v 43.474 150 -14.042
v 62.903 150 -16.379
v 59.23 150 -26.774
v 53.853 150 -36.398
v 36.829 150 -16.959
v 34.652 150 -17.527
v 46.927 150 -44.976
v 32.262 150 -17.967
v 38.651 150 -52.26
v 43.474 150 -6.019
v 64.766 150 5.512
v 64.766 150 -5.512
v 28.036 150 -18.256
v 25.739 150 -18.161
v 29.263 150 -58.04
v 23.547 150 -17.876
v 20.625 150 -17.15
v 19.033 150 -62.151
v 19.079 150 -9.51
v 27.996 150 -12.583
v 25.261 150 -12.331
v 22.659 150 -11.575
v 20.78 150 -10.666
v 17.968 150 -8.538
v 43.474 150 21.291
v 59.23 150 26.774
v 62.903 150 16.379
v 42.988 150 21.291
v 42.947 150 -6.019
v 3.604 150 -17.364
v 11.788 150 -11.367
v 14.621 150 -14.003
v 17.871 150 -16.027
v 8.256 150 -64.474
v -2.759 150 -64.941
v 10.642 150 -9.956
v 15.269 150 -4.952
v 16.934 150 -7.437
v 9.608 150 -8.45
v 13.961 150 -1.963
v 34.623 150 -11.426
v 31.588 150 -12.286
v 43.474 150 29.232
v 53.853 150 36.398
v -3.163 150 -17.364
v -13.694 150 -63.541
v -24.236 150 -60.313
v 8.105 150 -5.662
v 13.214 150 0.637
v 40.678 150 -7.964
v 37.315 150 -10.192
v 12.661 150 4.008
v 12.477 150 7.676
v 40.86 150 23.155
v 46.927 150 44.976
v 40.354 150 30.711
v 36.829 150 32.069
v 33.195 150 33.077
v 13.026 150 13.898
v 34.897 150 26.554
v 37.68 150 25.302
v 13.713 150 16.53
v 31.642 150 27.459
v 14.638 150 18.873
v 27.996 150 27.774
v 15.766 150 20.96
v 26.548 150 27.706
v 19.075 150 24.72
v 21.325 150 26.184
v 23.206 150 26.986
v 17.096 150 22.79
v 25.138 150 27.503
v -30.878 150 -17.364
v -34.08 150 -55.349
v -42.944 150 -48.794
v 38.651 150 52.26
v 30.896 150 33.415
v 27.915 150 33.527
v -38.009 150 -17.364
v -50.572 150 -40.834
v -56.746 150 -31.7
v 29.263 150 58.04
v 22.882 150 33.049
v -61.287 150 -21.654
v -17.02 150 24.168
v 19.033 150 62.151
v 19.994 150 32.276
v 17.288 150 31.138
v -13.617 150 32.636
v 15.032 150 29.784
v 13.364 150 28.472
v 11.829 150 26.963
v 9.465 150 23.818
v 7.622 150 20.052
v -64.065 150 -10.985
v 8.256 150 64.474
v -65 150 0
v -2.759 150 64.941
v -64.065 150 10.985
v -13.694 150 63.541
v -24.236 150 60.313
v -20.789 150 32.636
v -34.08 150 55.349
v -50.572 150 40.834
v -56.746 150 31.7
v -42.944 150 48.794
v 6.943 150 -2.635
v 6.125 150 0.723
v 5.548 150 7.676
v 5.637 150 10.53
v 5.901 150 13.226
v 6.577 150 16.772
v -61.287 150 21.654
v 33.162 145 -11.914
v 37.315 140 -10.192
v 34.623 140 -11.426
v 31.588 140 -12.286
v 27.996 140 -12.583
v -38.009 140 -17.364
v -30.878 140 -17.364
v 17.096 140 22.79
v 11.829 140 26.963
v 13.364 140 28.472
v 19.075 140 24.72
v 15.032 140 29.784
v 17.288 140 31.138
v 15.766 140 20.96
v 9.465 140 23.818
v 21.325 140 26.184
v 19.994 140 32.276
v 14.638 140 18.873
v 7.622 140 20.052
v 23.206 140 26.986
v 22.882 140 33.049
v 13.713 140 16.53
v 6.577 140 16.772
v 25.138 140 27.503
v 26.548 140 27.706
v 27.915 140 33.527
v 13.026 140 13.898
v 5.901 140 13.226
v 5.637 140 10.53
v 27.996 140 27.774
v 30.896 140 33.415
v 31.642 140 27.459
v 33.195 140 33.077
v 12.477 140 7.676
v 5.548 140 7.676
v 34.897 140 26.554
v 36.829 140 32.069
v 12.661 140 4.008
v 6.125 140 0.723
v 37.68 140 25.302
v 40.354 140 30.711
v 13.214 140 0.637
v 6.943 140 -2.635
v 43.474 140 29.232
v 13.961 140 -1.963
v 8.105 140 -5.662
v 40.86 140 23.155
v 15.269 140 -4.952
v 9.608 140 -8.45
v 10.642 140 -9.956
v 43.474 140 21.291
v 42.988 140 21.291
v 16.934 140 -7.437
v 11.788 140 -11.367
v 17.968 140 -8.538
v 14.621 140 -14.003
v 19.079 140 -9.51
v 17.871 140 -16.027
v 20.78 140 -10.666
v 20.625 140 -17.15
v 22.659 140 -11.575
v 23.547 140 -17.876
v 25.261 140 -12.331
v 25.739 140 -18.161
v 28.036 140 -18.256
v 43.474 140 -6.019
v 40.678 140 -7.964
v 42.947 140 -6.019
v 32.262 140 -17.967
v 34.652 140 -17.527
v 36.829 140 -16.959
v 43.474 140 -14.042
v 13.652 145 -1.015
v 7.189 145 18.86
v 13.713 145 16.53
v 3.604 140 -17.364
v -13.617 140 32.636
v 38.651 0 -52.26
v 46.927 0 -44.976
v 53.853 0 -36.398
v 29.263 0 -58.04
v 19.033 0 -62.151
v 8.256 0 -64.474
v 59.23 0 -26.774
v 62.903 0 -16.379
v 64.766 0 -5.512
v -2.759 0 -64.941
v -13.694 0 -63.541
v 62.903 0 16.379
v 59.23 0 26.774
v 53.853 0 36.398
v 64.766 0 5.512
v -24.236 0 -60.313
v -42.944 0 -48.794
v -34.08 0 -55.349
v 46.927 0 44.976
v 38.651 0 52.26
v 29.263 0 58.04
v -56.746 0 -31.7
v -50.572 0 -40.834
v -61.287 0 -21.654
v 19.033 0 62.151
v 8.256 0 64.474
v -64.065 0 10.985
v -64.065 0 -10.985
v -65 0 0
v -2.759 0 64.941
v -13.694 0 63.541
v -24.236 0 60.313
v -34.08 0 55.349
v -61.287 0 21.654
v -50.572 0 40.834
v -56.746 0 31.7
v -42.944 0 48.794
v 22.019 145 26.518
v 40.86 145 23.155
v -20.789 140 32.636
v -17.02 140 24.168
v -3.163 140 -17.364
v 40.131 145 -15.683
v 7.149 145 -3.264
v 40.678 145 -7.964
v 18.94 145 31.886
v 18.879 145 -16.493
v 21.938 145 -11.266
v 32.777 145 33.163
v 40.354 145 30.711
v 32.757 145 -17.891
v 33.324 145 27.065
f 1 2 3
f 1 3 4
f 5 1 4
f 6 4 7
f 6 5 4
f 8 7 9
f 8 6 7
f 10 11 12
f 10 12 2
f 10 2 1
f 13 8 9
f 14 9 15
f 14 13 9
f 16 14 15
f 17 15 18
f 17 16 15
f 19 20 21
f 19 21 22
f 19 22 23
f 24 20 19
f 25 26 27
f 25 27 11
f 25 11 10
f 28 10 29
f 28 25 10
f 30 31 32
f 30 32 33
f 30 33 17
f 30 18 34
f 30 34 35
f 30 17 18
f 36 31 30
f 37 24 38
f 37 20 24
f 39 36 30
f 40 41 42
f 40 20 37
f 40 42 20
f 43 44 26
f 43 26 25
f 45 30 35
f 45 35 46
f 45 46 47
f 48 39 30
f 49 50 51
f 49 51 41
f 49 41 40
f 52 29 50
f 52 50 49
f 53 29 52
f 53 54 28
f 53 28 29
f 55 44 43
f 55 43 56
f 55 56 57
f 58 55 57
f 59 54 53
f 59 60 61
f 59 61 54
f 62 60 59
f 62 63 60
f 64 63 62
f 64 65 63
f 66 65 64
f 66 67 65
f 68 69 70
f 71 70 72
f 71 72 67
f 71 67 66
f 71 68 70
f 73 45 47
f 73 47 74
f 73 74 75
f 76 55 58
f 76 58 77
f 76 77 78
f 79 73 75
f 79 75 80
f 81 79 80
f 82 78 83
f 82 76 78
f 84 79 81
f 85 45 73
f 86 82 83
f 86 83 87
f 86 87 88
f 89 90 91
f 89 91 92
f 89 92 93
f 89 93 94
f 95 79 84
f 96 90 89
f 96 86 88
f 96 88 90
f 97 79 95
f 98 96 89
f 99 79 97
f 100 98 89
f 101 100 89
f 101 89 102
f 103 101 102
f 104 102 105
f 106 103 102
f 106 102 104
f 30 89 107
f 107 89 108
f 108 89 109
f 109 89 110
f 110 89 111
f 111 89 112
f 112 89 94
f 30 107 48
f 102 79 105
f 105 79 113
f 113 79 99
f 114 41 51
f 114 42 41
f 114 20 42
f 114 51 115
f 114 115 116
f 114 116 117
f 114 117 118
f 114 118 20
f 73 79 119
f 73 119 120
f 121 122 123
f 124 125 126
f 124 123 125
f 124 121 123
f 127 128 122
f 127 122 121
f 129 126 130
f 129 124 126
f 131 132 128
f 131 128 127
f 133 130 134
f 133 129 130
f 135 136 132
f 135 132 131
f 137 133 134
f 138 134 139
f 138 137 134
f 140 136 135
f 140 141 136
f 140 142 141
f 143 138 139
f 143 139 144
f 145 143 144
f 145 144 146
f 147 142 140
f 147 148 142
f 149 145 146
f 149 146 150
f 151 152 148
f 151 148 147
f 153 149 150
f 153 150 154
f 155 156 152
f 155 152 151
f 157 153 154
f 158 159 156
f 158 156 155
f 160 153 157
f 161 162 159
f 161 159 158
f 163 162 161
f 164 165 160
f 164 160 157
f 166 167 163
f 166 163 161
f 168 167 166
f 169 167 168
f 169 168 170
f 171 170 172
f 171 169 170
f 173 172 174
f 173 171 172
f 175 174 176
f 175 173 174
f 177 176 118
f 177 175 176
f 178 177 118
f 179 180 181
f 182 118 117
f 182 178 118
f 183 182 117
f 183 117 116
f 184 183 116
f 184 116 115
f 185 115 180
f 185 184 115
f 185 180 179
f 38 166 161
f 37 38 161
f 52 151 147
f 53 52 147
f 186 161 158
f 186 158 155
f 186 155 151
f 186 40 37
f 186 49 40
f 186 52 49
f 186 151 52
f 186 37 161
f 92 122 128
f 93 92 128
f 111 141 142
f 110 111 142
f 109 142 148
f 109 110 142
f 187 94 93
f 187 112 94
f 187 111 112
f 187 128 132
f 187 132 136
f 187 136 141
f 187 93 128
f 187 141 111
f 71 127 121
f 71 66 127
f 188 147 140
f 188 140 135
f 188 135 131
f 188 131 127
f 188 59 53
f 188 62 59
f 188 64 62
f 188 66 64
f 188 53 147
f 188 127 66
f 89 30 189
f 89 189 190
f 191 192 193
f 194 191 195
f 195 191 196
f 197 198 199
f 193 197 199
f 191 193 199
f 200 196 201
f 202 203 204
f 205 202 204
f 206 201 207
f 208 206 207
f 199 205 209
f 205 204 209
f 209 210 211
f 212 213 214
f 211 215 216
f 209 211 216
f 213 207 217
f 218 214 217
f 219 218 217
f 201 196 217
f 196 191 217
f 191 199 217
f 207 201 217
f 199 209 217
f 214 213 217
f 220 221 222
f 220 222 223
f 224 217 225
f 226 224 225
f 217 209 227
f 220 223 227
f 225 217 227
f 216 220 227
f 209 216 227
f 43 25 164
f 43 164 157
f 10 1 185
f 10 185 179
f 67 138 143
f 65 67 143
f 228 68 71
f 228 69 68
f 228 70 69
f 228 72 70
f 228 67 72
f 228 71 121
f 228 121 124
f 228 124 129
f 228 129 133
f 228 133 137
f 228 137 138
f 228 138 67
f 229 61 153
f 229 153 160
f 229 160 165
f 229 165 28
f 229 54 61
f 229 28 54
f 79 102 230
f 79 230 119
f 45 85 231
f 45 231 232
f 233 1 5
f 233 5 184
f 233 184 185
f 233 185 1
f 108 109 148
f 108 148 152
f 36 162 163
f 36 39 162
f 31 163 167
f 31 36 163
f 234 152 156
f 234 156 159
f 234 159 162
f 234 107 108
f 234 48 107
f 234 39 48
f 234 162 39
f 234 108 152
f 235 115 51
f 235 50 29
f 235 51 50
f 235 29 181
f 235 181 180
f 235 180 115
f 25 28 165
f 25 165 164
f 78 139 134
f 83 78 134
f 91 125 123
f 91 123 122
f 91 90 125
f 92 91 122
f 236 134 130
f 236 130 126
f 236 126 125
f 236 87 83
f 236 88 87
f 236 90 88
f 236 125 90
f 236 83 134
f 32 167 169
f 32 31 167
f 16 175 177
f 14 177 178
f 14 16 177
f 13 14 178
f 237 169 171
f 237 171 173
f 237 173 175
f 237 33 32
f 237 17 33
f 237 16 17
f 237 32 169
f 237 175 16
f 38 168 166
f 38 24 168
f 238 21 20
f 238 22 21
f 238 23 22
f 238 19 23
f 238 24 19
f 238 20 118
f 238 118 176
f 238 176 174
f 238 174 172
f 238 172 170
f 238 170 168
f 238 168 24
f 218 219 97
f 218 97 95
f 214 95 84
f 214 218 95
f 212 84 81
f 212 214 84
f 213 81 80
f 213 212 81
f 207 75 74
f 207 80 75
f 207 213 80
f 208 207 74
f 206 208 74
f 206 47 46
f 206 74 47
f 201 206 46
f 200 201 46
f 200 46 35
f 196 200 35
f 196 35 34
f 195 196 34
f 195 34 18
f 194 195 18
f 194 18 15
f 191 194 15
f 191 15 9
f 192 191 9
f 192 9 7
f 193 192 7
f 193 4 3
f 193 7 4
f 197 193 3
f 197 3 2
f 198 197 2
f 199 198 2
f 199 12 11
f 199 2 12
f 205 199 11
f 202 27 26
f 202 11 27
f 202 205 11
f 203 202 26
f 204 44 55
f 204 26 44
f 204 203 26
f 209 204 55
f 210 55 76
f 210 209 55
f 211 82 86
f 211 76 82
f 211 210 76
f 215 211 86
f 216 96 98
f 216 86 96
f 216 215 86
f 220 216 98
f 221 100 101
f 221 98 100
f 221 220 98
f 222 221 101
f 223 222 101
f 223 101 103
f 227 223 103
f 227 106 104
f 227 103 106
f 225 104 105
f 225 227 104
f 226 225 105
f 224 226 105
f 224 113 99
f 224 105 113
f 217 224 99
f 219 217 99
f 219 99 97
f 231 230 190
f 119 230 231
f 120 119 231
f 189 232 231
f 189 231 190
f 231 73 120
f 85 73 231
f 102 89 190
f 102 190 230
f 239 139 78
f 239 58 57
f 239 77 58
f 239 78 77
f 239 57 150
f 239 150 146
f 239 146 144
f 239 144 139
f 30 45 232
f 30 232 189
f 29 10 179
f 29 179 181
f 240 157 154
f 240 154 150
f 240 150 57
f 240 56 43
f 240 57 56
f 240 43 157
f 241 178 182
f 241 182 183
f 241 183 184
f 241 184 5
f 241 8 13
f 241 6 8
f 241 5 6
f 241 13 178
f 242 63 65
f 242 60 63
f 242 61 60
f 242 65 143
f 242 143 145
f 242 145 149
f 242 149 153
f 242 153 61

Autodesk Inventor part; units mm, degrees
ref_plane "YZ Plane" through (0, 0, 0) normal (1, 0, 0) x (0, 1, 0)
ref_plane "XZ Plane" through (0, 0, 0) normal (0, 1, 0) x (-1, 0, 0)
ref_plane "XY Plane" through (0, 0, 0) normal (0, 0, 1) x (1, 0, 0)
sketch "Sketch1" plane through (0, 0, 0) normal (0, 1, 0) x (-1, 0, 0)
  circle A0 centre (0, 0) radius 65
  line L0 (0, 0) -> (0, -25) construction
  circle A1 centre (0, -25) radius 11.5 construction
  circle A2 centre (21.6506, -12.5) radius 11.5 construction
  circle A3 centre (21.6506, 12.5) radius 11.5 construction
  circle A4 centre (0, 25) radius 11.5 construction
  circle A5 centre (-21.6506, 12.5) radius 11.5 construction
  circle A6 centre (-21.6506, -12.5) radius 11.5 construction
  line L1 (0, 0) -> (-21.6506, 37.5) construction
  circle A7 centre (-21.6506, 37.5) radius 11.5 construction
  circle A8 centre (-43.3013, 0) radius 11.5 construction
  circle A9 centre (-21.6506, -37.5) radius 11.5 construction
  circle A10 centre (21.6506, -37.5) radius 11.5 construction
  circle A11 centre (43.3013, 0) radius 11.5 construction
  circle A12 centre (21.6506, 37.5) radius 11.5 construction
  circle A13 centre (0, 50) radius 11.5 construction
  circle A14 centre (-43.3013, 25) radius 11.5 construction
  circle A15 centre (-43.3013, -25) radius 11.5 construction
  circle A16 centre (0, -50) radius 11.5 construction
  circle A17 centre (43.3013, -25) radius 11.5 construction
  circle A18 centre (43.3013, 25) radius 11.5 construction
  dimension "d0" = 130
  dimension "d5" = 25
  dimension "d6" = 23
  dimension "d9" = 360
  dimension "d11" = 23
  dimension "d13" = 150
  dimension "d16" = 360
  dimension "d18" = 25
  dimension "d19" = 25
  dimension "d20" = 25
  dimension "d21" = 25
  dimension "d22" = 23
  dimension "d25" = 360
extrude "Extrusion1" add sketch "Sketch1" along normal blind 150
sketch "Sketch2" plane through (0, 150, 0) normal (0, 1, 0) x (1, 0, 0)
  line L0 (-37.7255, 18.2555) -> (-21.2587, 18.2555) construction
  line L1 (-21.2587, 18.2555) -> (-21.2587, 7.8989) construction
  line L2 (-21.2587, 7.8989) -> (-37.7255, 7.8989) construction
  line L3 (-37.7255, 7.8989) -> (-37.7255, 18.2555) construction
  line L4 (3.6035, 17.3641) -> (-13.6169, -32.6359)
  line L5 (-13.6169, -32.6359) -> (-20.7887, -32.6359)
  line L6 (-20.7887, -32.6359) -> (-38.0091, 17.3641)
  line L7 (-38.0091, 17.3641) -> (-30.8779, 17.3641)
  line L8 (-30.8779, 17.3641) -> (-17.0205, -24.1675)
  line L9 (-17.0205, -24.1675) -> (-3.1631, 17.3641)
  line L10 (-3.1631, 17.3641) -> (3.6035, 17.3641)
  spline S0 degree 2 poles (27.9147, -33.5273) (23.0524, -33.5273) (14.8272, -30.2453) (11.8288, -26.9633) knots 0 0 0 1 2 2 2
  spline S1 degree 2 poles (11.8288, -26.9633) (8.8304, -23.7218) (5.5484, -13.9973) (5.5484, -7.6764) knots 0 0 0 1 2 2 2
  spline S2 degree 2 poles (5.5484, -7.6764) (5.5484, -1.396) (8.7494, 7.9232) (11.7883, 11.3673) knots 0 0 0 1 2 2 2
  spline S3 degree 2 poles (11.7883, 11.3673) (14.7866, 14.7304) (22.9714, 18.2555) (28.0362, 18.2555) knots 0 0 0 1 2 2 2
  spline S4 degree 2 poles (28.0362, 18.2555) (30.5484, 18.2555) (34.9649, 17.5262) (36.8288, 16.9589) knots 0 0 0 1 2 2 2
  spline S5 degree 2 poles (36.8288, 16.9589) (38.4495, 16.4322) (41.8126, 14.933) (43.4738, 14.0416) knots 0 0 0 1 2 2 2
  line L11 (43.4738, 14.0416) -> (43.4738, 6.0189)
  line L12 (43.4738, 6.0189) -> (42.9471, 6.0189)
  spline S6 degree 2 poles (42.9471, 6.0189) (42.0557, 6.8292) (39.3004, 9.0983) (37.315, 10.1923) knots 0 0 0 1 2 2 2
  spline S7 degree 2 poles (37.315, 10.1923) (35.4106, 11.2458) (30.9131, 12.5829) (27.9957, 12.5829) knots 0 0 0 1 2 2 2
  spline S8 degree 2 poles (27.9957, 12.5829) (24.7947, 12.5829) (19.0816, 9.9492) (16.9341, 7.437) knots 0 0 0 1 2 2 2
  spline S9 degree 2 poles (16.9341, 7.437) (14.8272, 4.8843) (12.4771, -2.8547) (12.4771, -7.6764) knots 0 0 0 1 2 2 2
  spline S10 degree 2 poles (12.4771, -7.6764) (12.4771, -12.8223) (14.9487, -20.2372) (17.0962, -22.7899) knots 0 0 0 1 2 2 2
  spline S11 degree 2 poles (17.0962, -22.7899) (19.2032, -25.2615) (24.8353, -27.7737) (27.9957, -27.7737) knots 0 0 0 1 2 2 2
  spline S12 degree 2 poles (27.9957, -27.7737) (30.8725, -27.7737) (35.7753, -26.3555) (37.6797, -25.302) knots 0 0 0 1 2 2 2
  spline S13 degree 2 poles (37.6797, -25.302) (39.503, -24.2486) (42.2178, -22.0606) (42.9876, -21.2907) knots 0 0 0 1 2 2 2
  line L13 (42.9876, -21.2907) -> (43.4738, -21.2907)
  line L14 (43.4738, -21.2907) -> (43.4738, -29.2324)
  spline S14 degree 2 poles (43.4738, -29.2324) (41.8126, -30.0022) (38.8952, -31.4204) (36.8288, -32.0687) knots 0 0 0 1 2 2 2
  spline S15 degree 2 poles (36.8288, -32.0687) (34.6408, -32.798) (30.9131, -33.5273) (27.9147, -33.5273) knots 0 0 0 1 2 2 2
  point P0 (0, 0)
extrude "Extrusion2" cut sketch "Sketch2" against normal blind 10
equation "\"d11\" = d6"
equation "\"d21\" = d19"
equation "\"d22\" = d6"
properties part number "VialCarousel"
